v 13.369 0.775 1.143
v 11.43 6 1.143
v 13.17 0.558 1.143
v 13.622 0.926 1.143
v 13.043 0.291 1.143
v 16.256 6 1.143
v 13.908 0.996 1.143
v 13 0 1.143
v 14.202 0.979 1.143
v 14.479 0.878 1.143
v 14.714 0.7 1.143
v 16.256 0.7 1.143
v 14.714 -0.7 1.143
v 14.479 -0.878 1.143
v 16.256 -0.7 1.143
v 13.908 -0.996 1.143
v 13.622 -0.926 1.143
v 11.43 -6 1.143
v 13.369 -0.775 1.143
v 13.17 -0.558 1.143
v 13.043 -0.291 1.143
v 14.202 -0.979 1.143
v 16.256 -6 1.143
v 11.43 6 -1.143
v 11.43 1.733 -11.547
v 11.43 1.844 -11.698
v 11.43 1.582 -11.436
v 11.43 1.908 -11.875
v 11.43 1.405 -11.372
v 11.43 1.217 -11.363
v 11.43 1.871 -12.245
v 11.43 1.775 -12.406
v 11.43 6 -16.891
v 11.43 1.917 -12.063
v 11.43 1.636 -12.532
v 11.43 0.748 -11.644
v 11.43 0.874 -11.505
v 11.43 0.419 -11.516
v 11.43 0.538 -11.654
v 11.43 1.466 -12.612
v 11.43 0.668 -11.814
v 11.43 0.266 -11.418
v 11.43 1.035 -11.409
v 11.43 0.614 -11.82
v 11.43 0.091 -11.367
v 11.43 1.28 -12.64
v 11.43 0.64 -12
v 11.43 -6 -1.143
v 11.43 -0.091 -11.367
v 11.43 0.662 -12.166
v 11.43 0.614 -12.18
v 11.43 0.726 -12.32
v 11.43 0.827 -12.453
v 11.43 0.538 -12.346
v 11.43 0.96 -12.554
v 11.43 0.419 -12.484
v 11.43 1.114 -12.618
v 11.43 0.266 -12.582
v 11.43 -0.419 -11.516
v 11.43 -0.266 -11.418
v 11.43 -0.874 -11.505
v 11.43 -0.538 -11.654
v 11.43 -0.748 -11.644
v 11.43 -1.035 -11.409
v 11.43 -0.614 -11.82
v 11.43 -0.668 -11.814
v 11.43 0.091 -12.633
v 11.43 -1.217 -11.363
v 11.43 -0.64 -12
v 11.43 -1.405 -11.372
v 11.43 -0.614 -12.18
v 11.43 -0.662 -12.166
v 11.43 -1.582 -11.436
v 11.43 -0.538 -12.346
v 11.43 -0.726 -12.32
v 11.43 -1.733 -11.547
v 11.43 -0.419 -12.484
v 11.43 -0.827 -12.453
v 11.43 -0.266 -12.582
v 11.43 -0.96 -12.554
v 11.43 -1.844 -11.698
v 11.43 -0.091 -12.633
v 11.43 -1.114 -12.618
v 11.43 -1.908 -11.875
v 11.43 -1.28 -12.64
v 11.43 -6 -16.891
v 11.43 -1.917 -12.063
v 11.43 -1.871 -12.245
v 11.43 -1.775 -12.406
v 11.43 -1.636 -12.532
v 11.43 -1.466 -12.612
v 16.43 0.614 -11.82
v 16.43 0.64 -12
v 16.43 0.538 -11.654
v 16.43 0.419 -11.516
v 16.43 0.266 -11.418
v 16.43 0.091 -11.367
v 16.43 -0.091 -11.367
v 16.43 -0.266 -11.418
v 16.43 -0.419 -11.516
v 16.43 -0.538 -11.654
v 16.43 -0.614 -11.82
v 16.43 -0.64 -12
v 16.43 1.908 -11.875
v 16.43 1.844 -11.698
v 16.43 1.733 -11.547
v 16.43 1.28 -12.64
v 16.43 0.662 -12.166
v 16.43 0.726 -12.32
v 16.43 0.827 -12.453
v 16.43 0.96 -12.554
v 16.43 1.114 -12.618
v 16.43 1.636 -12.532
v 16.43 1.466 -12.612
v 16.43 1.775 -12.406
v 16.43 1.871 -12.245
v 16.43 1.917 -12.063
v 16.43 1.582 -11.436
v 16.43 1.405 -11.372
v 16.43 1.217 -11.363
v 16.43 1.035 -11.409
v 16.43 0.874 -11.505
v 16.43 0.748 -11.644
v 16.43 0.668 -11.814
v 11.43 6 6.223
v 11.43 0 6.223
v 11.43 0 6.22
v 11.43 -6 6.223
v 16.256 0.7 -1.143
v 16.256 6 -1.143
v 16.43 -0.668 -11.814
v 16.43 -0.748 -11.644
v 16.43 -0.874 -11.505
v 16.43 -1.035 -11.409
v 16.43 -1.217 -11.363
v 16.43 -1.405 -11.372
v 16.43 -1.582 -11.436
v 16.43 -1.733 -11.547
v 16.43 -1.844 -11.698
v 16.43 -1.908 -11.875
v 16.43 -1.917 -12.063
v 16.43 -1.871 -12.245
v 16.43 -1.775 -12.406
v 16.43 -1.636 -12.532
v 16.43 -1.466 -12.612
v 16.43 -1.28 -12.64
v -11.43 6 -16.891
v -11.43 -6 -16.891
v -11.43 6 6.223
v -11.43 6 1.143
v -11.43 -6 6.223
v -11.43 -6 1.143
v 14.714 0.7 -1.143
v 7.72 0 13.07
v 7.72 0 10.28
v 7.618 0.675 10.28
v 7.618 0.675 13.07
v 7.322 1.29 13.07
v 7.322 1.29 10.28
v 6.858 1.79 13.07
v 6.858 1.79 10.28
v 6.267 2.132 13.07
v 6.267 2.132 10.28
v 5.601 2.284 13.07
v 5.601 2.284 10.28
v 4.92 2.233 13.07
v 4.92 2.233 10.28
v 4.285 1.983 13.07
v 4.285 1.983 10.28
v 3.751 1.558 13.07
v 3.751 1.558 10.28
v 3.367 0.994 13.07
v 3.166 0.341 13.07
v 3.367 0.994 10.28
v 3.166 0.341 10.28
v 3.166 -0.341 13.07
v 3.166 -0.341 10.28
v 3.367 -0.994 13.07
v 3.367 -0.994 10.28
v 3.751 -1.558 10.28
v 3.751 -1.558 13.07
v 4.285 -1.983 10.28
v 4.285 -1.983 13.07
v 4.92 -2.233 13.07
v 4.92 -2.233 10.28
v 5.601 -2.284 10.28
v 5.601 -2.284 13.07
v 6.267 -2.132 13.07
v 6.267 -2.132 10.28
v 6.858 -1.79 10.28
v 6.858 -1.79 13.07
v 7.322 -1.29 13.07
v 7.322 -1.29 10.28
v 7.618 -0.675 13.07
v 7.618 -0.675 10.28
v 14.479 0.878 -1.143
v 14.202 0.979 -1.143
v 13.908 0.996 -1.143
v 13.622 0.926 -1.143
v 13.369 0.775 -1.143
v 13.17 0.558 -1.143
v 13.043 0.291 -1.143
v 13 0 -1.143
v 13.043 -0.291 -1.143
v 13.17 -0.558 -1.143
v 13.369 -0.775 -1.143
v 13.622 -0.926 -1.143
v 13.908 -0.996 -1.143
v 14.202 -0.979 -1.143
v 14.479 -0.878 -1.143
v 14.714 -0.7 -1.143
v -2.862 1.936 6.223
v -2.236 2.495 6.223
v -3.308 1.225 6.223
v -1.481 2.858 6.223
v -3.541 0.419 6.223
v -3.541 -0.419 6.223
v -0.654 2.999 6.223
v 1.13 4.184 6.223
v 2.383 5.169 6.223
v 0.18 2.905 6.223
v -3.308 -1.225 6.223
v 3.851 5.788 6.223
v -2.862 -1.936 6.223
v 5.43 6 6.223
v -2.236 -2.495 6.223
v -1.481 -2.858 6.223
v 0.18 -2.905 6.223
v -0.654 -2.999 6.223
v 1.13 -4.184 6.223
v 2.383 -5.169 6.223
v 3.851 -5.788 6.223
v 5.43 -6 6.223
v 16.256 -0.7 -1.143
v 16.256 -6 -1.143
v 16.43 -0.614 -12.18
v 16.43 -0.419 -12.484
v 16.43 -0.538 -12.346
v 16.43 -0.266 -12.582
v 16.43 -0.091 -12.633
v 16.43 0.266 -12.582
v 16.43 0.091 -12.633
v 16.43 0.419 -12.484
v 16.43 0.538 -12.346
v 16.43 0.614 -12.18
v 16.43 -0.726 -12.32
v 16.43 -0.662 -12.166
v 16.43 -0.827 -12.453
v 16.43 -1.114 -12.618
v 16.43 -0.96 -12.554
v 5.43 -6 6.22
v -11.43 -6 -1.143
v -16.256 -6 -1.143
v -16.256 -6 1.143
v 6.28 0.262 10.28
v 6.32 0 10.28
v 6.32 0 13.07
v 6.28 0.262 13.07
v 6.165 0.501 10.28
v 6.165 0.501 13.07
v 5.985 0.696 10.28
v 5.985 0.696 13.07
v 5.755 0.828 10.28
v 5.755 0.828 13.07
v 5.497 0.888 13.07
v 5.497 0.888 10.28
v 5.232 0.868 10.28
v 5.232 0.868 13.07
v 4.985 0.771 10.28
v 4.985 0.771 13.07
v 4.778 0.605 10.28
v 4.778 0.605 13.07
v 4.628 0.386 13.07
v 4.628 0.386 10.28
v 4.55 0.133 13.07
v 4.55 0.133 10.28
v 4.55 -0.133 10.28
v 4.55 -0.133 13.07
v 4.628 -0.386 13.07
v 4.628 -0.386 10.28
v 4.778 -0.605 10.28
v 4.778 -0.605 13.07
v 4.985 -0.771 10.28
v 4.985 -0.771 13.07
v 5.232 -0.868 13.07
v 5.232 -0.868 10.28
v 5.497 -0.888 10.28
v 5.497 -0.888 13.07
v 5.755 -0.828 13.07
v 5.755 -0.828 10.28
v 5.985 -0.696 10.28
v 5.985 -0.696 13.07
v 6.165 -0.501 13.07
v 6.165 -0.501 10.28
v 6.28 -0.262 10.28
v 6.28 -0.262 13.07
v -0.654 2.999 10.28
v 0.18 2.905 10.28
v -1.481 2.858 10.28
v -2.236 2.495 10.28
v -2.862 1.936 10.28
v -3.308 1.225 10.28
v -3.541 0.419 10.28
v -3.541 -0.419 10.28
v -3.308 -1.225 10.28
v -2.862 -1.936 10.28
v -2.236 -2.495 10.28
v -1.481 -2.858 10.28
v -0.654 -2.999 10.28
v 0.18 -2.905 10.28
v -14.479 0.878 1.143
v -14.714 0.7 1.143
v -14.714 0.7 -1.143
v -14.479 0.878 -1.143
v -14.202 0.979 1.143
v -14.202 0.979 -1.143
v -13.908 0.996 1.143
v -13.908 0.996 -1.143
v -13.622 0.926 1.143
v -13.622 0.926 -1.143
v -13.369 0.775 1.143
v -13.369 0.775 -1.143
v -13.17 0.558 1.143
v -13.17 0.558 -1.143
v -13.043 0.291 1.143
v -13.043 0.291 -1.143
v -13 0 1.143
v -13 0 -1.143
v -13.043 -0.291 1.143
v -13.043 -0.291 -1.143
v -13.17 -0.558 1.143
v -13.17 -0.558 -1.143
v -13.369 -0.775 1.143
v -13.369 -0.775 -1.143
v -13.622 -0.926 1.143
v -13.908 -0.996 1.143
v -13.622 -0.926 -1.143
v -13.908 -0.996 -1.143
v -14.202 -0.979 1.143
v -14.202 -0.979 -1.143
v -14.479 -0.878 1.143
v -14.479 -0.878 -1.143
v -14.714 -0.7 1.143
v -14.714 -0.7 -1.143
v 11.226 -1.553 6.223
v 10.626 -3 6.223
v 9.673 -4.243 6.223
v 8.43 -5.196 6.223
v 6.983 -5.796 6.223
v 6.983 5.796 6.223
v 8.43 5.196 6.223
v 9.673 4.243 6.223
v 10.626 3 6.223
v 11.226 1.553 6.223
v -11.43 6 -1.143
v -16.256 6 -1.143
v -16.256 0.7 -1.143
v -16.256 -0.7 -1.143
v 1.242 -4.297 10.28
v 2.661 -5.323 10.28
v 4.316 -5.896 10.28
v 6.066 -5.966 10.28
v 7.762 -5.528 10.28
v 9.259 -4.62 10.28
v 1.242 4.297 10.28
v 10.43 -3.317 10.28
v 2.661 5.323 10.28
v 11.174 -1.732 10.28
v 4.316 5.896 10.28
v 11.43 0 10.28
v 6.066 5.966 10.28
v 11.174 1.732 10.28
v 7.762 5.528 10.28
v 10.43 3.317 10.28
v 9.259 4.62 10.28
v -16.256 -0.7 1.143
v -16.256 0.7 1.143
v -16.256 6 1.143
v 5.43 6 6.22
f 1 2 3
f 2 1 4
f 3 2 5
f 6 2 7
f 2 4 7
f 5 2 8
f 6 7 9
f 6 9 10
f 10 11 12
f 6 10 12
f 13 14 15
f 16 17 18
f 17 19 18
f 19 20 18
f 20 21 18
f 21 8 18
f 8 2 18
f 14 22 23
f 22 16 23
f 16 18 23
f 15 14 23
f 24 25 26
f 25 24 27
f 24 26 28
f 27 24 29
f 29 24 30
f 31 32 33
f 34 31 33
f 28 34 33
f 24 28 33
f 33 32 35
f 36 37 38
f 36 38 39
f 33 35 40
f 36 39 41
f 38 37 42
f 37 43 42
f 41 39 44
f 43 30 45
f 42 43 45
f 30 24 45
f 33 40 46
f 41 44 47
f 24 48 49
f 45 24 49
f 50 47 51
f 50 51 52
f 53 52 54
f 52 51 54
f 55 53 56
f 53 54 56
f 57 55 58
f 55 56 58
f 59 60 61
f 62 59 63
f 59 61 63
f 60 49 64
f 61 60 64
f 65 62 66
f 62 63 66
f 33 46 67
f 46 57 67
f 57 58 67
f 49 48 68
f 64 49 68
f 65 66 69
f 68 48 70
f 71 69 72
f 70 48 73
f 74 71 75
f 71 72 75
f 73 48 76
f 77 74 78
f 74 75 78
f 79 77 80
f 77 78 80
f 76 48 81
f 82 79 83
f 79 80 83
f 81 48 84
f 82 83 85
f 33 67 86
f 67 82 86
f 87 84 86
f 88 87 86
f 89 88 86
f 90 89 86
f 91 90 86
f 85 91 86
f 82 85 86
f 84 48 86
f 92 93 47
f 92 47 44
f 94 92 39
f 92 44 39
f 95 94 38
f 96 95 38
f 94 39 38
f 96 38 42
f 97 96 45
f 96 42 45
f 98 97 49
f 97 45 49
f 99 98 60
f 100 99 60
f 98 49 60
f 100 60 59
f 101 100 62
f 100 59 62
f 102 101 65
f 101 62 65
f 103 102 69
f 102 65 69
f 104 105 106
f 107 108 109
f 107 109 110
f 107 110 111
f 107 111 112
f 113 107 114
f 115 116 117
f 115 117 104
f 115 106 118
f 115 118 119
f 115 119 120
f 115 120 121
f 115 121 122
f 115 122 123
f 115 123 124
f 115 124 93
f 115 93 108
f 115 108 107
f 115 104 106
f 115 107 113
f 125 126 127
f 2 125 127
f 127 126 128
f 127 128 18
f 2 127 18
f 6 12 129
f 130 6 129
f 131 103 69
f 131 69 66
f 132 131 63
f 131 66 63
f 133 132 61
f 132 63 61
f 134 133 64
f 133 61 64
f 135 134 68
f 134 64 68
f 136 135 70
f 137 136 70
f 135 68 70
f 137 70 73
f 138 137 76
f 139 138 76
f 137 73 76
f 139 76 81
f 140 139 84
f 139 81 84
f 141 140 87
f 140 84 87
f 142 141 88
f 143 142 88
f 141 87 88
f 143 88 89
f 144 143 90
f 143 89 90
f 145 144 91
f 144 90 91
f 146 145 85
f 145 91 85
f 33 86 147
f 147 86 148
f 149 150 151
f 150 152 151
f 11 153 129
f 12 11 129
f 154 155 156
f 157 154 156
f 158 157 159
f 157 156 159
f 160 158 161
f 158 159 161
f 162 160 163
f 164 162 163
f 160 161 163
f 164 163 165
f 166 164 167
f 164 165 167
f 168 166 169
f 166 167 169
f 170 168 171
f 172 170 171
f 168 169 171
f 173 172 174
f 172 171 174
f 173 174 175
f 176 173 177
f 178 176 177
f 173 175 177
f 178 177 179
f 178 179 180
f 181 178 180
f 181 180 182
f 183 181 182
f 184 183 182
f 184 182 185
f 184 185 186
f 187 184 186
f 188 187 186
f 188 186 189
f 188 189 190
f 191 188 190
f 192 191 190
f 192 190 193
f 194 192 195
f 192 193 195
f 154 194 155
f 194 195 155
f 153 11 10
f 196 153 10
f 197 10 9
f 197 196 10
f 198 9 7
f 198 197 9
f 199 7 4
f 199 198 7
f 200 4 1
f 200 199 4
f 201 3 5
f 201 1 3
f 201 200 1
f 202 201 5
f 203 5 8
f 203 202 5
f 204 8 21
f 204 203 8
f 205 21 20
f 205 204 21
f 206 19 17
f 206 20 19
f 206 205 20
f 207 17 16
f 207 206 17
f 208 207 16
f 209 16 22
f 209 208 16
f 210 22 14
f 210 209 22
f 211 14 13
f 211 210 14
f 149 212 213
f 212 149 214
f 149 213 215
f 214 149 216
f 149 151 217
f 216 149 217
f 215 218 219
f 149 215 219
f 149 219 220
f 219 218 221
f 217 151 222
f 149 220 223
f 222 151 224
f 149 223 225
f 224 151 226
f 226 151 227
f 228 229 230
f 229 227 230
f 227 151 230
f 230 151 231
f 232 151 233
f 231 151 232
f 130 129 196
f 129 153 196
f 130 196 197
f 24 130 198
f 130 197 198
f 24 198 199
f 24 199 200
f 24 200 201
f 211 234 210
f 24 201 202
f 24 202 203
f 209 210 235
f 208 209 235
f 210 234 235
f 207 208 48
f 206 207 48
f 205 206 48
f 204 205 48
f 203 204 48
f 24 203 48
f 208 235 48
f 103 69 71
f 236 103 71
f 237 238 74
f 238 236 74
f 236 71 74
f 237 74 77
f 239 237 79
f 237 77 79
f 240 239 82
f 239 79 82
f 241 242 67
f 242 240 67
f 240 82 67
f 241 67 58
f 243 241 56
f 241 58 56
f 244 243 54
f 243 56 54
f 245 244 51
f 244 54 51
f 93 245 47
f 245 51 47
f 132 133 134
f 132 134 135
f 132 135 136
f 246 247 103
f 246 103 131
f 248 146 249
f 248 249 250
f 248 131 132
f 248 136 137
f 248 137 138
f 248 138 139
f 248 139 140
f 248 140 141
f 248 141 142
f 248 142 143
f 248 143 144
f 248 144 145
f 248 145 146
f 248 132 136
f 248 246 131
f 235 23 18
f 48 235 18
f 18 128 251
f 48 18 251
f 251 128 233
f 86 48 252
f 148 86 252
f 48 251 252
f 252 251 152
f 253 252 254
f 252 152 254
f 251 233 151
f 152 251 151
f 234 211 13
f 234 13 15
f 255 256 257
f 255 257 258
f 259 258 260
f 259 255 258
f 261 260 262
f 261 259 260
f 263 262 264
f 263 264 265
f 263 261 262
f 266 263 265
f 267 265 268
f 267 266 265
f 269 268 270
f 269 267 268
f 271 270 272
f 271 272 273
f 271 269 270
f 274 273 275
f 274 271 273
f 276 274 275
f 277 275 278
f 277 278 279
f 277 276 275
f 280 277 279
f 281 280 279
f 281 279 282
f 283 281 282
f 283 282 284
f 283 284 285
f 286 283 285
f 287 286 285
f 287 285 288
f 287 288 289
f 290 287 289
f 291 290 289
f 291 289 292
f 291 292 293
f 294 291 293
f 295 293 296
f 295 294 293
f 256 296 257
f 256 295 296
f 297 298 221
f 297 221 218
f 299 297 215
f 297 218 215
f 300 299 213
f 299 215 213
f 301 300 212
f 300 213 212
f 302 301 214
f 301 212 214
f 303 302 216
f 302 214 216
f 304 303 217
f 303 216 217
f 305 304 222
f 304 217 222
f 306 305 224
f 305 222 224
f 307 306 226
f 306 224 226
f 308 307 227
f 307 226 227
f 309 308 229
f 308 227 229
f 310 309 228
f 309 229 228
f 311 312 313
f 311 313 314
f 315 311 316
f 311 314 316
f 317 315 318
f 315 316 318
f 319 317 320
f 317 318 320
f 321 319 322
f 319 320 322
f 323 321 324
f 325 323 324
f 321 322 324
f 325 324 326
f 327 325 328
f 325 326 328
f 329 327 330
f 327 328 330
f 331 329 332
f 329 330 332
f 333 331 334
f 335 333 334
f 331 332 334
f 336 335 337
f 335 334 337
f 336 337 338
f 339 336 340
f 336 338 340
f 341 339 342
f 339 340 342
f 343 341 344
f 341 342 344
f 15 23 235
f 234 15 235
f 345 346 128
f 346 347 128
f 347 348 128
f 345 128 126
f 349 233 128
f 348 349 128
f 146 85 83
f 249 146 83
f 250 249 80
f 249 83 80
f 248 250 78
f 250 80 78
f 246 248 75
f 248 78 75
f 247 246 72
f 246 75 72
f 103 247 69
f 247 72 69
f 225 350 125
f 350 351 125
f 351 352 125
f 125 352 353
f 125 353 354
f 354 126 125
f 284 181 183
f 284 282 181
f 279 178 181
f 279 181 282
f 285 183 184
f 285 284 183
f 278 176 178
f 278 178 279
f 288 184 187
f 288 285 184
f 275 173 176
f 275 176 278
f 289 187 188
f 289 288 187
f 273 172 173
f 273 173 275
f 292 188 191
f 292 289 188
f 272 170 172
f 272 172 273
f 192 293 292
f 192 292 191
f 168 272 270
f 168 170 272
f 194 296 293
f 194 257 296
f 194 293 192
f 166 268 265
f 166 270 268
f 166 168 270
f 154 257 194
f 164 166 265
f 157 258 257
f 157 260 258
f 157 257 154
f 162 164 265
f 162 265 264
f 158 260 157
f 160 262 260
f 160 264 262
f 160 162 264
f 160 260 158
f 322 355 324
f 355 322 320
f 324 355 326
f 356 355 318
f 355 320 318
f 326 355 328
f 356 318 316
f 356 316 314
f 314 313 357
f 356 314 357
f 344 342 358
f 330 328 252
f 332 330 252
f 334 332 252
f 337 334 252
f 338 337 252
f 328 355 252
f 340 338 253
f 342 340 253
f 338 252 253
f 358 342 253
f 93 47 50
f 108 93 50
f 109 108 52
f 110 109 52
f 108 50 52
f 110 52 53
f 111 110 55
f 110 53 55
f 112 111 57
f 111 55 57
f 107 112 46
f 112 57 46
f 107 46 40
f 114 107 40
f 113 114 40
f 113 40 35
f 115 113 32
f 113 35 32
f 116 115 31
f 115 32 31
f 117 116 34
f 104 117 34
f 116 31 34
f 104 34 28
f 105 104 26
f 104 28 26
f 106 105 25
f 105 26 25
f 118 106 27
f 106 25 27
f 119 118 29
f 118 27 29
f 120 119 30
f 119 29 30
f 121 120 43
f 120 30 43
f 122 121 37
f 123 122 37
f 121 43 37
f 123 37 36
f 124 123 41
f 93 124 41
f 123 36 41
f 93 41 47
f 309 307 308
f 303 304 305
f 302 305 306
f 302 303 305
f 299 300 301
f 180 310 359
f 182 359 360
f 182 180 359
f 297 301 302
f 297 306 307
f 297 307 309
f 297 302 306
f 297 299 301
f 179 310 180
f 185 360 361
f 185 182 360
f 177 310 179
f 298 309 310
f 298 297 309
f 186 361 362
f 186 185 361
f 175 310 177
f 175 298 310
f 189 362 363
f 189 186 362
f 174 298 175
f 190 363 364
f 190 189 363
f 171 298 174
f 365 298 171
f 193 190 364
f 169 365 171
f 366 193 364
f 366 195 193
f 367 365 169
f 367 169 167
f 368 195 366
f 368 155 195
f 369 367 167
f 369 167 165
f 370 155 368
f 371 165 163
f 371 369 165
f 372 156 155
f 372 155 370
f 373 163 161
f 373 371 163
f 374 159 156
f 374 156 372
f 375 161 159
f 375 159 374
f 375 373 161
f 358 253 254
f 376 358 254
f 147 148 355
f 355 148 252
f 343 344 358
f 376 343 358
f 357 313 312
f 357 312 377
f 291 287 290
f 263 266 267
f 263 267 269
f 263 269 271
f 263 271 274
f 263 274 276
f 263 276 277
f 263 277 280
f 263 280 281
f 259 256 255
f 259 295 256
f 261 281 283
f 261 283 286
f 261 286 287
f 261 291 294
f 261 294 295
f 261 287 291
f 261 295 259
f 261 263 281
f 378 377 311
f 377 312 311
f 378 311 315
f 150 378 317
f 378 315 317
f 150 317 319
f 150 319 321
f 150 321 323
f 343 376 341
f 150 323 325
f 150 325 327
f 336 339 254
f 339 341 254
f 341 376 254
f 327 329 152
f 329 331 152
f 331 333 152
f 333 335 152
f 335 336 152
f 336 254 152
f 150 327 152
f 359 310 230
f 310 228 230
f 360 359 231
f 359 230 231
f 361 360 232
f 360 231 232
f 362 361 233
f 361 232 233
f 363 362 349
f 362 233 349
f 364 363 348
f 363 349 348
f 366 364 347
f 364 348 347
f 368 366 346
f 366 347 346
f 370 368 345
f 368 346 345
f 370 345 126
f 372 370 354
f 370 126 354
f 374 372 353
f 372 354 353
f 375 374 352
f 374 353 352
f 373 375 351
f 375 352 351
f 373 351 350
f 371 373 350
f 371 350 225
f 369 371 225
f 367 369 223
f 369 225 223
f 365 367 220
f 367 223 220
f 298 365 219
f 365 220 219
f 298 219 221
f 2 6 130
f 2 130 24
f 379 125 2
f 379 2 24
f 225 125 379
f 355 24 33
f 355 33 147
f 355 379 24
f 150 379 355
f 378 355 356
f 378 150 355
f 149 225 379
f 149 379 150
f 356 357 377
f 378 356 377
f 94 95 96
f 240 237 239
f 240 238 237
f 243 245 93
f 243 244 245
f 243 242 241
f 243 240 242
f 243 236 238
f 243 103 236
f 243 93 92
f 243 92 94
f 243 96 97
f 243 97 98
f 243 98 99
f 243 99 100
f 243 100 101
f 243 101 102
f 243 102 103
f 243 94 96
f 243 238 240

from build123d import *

# Parameters (mm, degrees)
CYLINDER001_R           = 3
CYLINDER001_DEPTH       = 4.06
CYLINDER003_R           = 0.89
CYLINDER003_DEPTH       = 2.79
CYLINDER002_R           = 2.29
CYLINDER002_DEPTH       = 2.79
BOX_W                   = 10
BOX_H                   = 1.4
BOX_DEPTH               = 10
CYLINDER004_R           = 1
CYLINDER004_DEPTH       = 10
PAD_DEPTH               = 6
CYLINDER005_R           = 0.64
CYLINDER005_DEPTH       = 5
CYLINDER005_PITCH_ANGLE = 90
CYLINDER006_R           = 0.64
CYLINDER006_DEPTH       = 5
CYLINDER006_PITCH_ANGLE = 90
CYLINDER007_R           = 0.64
CYLINDER007_DEPTH       = 5
CYLINDER007_PITCH_ANGLE = 90
CYLINDER_R              = 6
CYLINDER_DEPTH          = 4.06


with BuildPart() as cylinder001:
    # Cylinder001 → Cylinder001 (new body)
    with BuildSketch(Plane(origin=(-0.57, 0, 6.22), x_dir=(1, 0, 0), z_dir=(0, 0, 1))):
        Circle(CYLINDER001_R)
    extrude(amount=CYLINDER001_DEPTH)


with BuildPart() as cylinder003:
    # Cylinder003 → Cylinder003 (new body)
    with BuildSketch(Plane(origin=(5.43, 0, 10.28), x_dir=(1, 0, 0), z_dir=(0, 0, 1))):
        Circle(CYLINDER003_R)
    extrude(amount=CYLINDER003_DEPTH)


with BuildPart() as cut:
    # Cylinder002 → Cylinder002 (new body)
    with BuildSketch(Plane(origin=(5.43, 0, 10.28), x_dir=(1, 0, 0), z_dir=(0, 0, 1))):
        Circle(CYLINDER002_R)
    extrude(amount=CYLINDER002_DEPTH)

    # Cut: cut Cylinder003
    add(cylinder003.part, mode=Mode.SUBTRACT)


with BuildPart() as box:
    # Box → Box (new body)
    with BuildSketch(Plane(origin=(14, -0.7, -3), x_dir=(1, 0, 0), z_dir=(0, 0, 1))):
        with Locations((5, 0.7)):
            Rectangle(BOX_W, BOX_H)
    extrude(amount=BOX_DEPTH)


with BuildPart() as part_mirroring001:
    # Part__Mirroring001: instance of Box
    add(box.part.mirror(Plane(origin=(0, 0, 0), x_dir=(0, -1, 0), z_dir=(1, 0, 0))))


with BuildPart() as cylinder004:
    # Cylinder004 → Cylinder004 (new body)
    with BuildSketch(Plane(origin=(14, 0, -3), x_dir=(1, 0, 0), z_dir=(0, 0, 1))):
        Circle(CYLINDER004_R)
    extrude(amount=CYLINDER004_DEPTH)


with BuildPart() as fusion:
    # Part__Mirroring: instance of Cylinder004
    add(cylinder004.part.mirror(Plane(origin=(0, 0, 0), x_dir=(0, -1, 0), z_dir=(1, 0, 0))))

    # Fusion: union Part__Mirroring001, Cylinder004, Box
    add(part_mirroring001.part)
    add(cylinder004.part)
    add(box.part)


with BuildPart() as cut001:
    # Sketch → Pad (new body, symmetric)
    with BuildSketch(Plane.XZ):
        Polygon((16.256, 1.143), (16.256, -1.143), (11.43, -1.143), (11.43, -16.891), (-11.43, -16.891), (-11.43, -1.143), (-16.256, -1.143), (-16.256, 1.143), (-11.43, 1.143), (-11.43, 6.223), (11.43, 6.223), (11.43, 1.143), align=None)
    extrude(amount=PAD_DEPTH, both=True)

    # Cut001: cut Fusion
    add(fusion.part, mode=Mode.SUBTRACT)


with BuildPart() as cylinder005:
    # Cylinder005 → Cylinder005 (new body)
    with BuildSketch(Plane.XY):
        Circle(CYLINDER005_R)
    extrude(amount=CYLINDER005_DEPTH)


with BuildPart() as cylinder005_1:
    # Cylinder005 pitch: moved
    add(cylinder005.part.rotate(Axis((0, 0, 0), (0, 1, 0)), CYLINDER005_PITCH_ANGLE))


with BuildPart() as cylinder005_2:
    # Cylinder005 placement: moved
    add(cylinder005_1.part.moved(Location((11.43, 0, -12))))


with BuildPart() as cylinder006:
    # Cylinder006 → Cylinder006 (new body)
    with BuildSketch(Plane.XY):
        Circle(CYLINDER006_R)
    extrude(amount=CYLINDER006_DEPTH)


with BuildPart() as cylinder006_1:
    # Cylinder006 pitch: moved
    add(cylinder006.part.rotate(Axis((0, 0, 0), (0, 1, 0)), CYLINDER006_PITCH_ANGLE))


with BuildPart() as cylinder006_2:
    # Cylinder006 placement: moved
    add(cylinder006_1.part.moved(Location((11.43, -1.28, -12))))


with BuildPart() as cylinder007:
    # Cylinder007 → Cylinder007 (new body)
    with BuildSketch(Plane.XY):
        Circle(CYLINDER007_R)
    extrude(amount=CYLINDER007_DEPTH)


with BuildPart() as cylinder007_1:
    # Cylinder007 pitch: moved
    add(cylinder007.part.rotate(Axis((0, 0, 0), (0, 1, 0)), CYLINDER007_PITCH_ANGLE))


with BuildPart() as cylinder007_2:
    # Cylinder007 placement: moved
    add(cylinder007_1.part.moved(Location((11.43, 1.28, -12))))


with BuildPart() as hxt900:
    # Cylinder → Cylinder (new body)
    with BuildSketch(Plane(origin=(5.43, 0, 6.22), x_dir=(1, 0, 0), z_dir=(0, 0, 1))):
        Circle(CYLINDER_R)
    extrude(amount=CYLINDER_DEPTH)

    # Fusion001: union Cylinder001, Cut, Cut001, Cylinder005, Cylinder006, Cylinder007
    add(cylinder001.part)
    add(cut.part)
    add(cut001.part)
    add(cylinder005_2.part)
    add(cylinder006_2.part)
    add(cylinder007_2.part)


solid = hxt900.part
